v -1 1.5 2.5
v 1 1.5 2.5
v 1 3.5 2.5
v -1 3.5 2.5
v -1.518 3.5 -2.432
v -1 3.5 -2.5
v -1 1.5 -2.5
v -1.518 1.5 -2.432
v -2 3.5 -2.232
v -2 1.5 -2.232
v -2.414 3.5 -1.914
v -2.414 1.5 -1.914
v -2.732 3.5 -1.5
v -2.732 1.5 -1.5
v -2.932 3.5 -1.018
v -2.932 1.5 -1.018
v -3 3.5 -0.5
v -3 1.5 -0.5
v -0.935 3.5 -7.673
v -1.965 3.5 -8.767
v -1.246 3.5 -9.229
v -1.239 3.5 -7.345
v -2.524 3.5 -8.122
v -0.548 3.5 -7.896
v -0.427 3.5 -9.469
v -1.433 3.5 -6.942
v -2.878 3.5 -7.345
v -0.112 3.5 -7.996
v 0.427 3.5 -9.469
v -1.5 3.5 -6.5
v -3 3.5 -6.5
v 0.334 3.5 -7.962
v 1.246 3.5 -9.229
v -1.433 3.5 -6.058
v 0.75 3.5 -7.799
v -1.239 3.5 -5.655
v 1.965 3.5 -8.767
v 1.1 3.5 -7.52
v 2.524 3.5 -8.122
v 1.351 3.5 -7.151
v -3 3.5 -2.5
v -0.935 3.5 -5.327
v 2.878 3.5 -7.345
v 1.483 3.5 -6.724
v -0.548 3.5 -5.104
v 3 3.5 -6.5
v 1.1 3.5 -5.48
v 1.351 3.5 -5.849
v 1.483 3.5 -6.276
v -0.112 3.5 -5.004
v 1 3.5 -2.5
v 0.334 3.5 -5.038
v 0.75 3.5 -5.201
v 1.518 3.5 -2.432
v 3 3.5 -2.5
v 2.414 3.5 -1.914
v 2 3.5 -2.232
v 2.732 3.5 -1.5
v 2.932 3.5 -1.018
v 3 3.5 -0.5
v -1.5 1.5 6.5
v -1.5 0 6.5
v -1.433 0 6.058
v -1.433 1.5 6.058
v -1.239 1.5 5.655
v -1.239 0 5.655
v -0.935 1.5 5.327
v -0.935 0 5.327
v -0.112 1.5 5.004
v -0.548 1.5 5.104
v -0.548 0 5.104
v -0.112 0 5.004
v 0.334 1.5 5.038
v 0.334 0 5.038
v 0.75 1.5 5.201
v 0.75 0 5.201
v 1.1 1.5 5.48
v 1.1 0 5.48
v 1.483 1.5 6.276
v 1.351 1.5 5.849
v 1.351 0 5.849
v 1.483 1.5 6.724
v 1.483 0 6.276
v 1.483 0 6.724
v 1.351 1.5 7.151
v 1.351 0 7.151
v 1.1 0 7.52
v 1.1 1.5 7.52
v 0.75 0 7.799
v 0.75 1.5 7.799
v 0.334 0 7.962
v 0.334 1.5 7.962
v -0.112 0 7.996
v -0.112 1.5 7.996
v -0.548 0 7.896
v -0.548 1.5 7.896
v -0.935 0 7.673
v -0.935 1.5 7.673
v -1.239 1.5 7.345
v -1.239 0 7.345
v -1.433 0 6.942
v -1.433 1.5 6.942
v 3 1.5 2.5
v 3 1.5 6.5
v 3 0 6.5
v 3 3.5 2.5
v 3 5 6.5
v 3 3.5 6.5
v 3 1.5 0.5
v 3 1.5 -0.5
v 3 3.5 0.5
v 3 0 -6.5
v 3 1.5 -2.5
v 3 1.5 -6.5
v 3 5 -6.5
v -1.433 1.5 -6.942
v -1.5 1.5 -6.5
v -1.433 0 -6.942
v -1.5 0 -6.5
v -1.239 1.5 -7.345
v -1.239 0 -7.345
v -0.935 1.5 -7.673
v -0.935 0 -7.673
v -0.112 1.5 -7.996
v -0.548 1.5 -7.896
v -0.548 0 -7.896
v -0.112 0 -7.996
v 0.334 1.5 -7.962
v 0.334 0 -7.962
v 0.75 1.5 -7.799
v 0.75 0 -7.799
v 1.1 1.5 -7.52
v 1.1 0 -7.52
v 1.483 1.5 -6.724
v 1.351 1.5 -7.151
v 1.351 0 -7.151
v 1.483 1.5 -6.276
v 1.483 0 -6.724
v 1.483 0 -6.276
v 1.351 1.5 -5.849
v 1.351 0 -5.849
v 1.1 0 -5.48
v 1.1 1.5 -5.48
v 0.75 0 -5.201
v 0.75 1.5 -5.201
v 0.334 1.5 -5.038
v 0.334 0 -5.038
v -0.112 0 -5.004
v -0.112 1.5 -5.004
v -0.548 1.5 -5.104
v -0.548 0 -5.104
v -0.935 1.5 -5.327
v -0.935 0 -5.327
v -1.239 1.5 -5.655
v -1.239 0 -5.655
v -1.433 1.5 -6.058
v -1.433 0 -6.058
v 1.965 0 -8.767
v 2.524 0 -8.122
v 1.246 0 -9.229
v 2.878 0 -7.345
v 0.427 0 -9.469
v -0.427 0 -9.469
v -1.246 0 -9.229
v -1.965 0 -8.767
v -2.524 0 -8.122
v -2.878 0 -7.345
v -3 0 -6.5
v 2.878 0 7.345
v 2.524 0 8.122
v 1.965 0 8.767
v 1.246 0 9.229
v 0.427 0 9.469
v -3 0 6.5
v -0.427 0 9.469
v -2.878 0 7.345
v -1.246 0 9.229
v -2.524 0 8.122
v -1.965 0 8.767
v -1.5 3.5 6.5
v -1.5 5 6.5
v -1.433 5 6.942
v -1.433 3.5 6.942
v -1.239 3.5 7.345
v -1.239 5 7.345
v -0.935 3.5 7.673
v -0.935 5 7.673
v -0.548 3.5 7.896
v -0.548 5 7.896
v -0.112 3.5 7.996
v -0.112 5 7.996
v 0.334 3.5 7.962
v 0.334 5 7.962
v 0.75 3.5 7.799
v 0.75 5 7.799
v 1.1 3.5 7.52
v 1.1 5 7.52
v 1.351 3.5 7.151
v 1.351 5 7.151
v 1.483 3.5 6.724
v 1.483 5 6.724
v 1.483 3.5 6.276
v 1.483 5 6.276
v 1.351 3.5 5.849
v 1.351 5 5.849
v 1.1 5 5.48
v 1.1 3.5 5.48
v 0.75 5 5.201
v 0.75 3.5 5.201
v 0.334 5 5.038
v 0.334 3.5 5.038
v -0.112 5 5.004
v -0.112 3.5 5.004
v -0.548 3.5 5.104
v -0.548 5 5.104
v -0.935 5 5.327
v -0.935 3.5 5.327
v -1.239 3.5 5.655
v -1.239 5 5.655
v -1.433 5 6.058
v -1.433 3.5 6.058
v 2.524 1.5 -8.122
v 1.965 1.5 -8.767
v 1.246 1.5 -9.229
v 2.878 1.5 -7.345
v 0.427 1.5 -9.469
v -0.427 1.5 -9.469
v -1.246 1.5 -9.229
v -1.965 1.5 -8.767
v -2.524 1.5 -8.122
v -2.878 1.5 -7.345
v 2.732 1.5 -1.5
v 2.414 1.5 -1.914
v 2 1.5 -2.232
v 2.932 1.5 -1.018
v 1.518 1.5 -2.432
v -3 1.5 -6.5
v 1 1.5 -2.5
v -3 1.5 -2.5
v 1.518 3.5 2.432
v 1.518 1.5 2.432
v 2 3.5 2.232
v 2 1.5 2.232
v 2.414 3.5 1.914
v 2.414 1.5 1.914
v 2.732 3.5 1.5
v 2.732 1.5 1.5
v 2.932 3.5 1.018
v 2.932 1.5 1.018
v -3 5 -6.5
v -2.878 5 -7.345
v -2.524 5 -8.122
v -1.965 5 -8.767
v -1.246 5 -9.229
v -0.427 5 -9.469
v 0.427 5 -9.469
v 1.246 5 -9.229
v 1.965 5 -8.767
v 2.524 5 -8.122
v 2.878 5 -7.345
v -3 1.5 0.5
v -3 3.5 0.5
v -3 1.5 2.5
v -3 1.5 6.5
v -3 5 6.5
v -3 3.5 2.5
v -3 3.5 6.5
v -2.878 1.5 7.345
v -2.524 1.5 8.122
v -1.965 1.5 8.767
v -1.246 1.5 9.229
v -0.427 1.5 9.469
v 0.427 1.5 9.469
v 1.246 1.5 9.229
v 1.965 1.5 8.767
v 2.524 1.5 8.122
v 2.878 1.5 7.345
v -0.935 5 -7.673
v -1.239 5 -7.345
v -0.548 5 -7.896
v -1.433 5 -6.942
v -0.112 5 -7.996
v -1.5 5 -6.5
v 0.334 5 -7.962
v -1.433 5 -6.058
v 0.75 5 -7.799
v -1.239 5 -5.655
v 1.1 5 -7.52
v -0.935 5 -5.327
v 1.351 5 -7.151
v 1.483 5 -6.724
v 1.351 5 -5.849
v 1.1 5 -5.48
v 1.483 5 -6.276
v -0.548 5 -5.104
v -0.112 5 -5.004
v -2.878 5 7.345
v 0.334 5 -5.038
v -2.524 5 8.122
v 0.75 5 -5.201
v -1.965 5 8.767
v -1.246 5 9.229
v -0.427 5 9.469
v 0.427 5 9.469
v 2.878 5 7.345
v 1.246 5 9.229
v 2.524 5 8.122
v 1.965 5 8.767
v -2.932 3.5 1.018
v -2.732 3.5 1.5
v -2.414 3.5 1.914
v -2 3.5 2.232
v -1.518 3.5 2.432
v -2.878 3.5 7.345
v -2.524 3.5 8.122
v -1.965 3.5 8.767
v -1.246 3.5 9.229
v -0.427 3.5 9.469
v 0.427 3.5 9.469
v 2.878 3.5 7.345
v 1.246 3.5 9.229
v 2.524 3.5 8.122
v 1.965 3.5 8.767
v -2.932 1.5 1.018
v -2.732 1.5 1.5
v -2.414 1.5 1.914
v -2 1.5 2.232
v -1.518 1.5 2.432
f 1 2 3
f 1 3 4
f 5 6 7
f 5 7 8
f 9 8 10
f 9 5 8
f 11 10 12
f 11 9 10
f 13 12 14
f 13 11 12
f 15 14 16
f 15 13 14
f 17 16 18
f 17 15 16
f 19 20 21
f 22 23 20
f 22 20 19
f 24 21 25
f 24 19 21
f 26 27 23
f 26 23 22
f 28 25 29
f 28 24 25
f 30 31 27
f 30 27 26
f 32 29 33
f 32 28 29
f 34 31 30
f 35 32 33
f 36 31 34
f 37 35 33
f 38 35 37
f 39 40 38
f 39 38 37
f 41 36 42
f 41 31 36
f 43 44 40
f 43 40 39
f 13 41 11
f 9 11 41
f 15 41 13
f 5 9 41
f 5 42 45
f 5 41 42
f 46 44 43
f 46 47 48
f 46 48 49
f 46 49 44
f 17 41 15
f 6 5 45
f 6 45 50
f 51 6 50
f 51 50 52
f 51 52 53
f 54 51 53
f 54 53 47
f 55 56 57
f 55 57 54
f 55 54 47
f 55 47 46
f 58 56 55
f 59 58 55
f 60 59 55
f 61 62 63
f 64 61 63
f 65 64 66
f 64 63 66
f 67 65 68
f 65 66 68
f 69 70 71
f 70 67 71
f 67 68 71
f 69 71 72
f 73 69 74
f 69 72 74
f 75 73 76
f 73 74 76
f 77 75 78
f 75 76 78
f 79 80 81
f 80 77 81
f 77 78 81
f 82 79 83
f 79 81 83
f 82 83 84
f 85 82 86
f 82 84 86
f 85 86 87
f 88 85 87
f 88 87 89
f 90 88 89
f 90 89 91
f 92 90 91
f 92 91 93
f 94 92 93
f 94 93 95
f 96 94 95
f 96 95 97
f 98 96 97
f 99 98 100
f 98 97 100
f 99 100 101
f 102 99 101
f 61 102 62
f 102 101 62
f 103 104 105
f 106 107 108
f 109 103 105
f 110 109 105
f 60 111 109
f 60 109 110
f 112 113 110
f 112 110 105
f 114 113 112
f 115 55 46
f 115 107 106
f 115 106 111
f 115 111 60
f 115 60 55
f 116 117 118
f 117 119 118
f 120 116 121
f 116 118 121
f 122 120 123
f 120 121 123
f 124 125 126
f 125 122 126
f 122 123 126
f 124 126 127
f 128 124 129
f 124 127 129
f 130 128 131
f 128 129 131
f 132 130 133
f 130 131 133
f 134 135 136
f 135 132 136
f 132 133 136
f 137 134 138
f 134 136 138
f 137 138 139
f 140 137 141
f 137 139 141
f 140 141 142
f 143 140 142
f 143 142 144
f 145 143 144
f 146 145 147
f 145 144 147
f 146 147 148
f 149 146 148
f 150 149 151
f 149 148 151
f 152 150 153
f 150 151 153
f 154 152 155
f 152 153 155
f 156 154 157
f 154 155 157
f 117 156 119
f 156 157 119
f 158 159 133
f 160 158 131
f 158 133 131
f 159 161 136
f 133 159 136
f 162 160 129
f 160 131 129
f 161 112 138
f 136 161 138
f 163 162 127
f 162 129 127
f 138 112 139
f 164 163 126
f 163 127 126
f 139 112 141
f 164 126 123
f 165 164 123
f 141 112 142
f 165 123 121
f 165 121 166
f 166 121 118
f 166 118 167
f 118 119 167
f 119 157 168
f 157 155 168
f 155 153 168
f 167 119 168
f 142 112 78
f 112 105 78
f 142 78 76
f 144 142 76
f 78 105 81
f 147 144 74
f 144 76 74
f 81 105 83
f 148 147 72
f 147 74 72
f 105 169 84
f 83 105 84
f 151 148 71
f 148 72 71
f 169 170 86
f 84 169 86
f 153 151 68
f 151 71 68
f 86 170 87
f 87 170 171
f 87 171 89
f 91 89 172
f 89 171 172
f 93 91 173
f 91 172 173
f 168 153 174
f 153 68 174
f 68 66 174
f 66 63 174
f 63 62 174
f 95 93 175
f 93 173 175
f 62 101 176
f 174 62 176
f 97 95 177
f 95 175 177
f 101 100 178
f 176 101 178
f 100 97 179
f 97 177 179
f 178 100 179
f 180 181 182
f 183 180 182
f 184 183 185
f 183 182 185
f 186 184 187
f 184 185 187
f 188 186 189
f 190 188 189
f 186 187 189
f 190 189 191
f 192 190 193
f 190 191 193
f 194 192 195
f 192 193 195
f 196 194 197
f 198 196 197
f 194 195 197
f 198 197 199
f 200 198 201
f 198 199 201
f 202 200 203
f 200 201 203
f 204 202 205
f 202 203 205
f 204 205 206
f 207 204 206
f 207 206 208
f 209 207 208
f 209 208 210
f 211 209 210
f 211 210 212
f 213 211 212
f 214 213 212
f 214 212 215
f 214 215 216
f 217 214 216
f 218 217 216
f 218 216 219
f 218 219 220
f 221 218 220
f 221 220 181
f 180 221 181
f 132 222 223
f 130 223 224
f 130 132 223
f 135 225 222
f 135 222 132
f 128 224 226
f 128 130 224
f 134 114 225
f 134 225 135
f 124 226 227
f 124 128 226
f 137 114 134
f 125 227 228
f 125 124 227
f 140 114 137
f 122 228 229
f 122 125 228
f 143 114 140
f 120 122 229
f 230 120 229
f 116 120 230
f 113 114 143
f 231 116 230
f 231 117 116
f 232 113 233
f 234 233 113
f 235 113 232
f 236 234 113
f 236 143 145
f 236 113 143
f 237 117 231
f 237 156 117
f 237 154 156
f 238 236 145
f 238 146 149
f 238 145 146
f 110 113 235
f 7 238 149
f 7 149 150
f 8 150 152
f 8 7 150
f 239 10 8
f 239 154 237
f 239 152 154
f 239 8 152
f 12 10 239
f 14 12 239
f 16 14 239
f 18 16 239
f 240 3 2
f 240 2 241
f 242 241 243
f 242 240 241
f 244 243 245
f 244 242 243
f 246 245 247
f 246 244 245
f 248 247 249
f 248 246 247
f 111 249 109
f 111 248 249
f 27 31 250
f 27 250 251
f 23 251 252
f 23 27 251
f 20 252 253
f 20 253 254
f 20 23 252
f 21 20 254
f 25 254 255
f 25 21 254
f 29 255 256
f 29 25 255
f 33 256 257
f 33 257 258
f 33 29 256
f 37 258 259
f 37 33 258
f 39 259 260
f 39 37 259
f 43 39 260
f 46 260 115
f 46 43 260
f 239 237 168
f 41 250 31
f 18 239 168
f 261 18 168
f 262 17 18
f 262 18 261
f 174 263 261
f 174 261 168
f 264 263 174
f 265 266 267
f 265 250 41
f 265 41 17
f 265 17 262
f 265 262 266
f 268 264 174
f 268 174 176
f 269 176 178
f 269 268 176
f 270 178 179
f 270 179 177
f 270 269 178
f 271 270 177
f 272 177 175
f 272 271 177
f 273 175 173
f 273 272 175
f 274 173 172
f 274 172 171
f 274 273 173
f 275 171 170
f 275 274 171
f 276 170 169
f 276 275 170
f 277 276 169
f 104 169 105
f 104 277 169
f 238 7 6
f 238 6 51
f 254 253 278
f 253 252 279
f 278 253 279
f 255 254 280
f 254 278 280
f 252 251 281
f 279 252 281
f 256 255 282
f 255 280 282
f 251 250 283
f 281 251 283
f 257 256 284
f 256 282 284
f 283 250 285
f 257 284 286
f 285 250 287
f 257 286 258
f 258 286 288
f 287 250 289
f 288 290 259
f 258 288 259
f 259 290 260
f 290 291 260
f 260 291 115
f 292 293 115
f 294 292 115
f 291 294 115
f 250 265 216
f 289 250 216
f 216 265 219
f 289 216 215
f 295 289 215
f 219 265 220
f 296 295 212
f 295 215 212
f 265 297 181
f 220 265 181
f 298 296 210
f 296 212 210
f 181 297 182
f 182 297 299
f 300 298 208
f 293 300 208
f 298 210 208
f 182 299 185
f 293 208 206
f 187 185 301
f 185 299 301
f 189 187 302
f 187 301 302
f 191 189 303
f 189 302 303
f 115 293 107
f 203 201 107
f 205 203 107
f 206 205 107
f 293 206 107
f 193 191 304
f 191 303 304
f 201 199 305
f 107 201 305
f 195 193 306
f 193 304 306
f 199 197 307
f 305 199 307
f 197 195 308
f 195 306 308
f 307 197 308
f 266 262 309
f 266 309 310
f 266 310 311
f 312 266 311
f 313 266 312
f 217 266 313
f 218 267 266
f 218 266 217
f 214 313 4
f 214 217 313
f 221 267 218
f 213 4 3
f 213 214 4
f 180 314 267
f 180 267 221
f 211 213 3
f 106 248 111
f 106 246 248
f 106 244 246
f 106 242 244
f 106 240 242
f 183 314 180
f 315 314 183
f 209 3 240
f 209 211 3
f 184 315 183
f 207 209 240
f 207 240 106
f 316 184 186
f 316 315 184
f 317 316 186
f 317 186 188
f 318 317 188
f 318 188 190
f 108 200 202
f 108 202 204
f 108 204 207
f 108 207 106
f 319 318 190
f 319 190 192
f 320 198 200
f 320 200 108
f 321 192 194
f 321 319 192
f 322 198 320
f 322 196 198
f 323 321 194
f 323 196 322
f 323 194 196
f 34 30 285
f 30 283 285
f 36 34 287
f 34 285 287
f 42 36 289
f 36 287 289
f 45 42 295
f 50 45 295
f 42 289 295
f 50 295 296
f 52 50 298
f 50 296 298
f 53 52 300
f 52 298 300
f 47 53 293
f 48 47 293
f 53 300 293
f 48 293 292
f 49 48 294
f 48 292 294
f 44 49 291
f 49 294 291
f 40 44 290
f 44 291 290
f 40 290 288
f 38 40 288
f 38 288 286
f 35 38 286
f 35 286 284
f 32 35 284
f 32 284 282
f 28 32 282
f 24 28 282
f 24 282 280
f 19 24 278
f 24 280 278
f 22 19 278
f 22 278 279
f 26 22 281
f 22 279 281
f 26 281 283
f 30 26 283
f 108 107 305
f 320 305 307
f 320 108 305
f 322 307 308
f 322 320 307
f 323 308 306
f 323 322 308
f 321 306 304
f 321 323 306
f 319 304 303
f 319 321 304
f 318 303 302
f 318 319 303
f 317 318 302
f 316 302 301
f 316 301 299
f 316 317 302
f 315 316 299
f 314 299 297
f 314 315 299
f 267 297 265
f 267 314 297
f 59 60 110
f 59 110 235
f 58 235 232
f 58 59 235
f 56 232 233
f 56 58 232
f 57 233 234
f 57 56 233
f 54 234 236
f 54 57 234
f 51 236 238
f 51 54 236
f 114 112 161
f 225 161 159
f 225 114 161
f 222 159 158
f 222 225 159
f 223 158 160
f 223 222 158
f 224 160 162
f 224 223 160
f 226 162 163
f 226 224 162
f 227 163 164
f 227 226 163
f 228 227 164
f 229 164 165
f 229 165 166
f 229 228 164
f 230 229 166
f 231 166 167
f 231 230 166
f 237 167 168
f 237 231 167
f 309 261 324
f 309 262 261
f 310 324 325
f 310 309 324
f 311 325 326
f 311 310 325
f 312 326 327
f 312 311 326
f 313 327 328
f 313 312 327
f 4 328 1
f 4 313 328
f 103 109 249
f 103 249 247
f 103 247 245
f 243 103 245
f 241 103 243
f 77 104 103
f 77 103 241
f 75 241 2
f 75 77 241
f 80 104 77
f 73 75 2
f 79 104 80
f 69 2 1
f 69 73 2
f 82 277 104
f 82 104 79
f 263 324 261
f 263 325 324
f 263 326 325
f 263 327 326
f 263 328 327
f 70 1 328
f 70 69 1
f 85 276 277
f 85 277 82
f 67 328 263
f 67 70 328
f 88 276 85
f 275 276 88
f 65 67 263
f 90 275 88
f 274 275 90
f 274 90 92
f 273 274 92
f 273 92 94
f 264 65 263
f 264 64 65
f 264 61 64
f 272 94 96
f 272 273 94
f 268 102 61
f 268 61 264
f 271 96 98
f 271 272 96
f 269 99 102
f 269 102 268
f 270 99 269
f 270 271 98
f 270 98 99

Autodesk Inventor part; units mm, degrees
ref_plane "YZ Plane" through (0, 0, 0) normal (1, 0, 0) x (0, 1, 0)
ref_plane "XZ Plane" through (0, 0, 0) normal (0, 1, 0) x (-1, 0, 0)
ref_plane "XY Plane" through (0, 0, 0) normal (0, 0, 1) x (1, 0, 0)
sketch "Sketch1" plane through (0, 0, 0) normal (0, 1, 0) x (-1, 0, 0)
  line L0 (-3, 10) -> (3, 10)
  line L1 (3, 10) -> (3, -10)
  line L2 (3, -10) -> (-3, -10)
  line L3 (-3, -10) -> (-3, 10)
  line L4 (-3, 10) -> (3, -10) construction
  line L5 (3, 10) -> (-3, -10) construction
  line L6 (0, -10) -> (0, -6.5) construction
  line L7 (0, 10) -> (0, 6.5) construction
  circle A0 centre (0, 6.5) radius 1.5
  circle A1 centre (0, -6.5) radius 1.5
  point P0 (0, 0)
  dimension "d0" = 6
  dimension "d1" = 20
  dimension "d2" = 3.5
  dimension "d3" = 3.5
  dimension "d4" = 3
  dimension "d5" = 3
extrude "Extrusion1" add sketch "Sketch1" along normal blind 1.5
fillet "Fillet1" radius 2 4 edges at (3, 0.75, 10) (-3, 0.75, 10) (3, 0.75, -10) (-3, 0.75, -10)
sketch "Sketch2" plane through (0, 1.5, 0) normal (0, 1, 0) x (1, 0, 0)
  circle A0 centre (0, -6.5) radius 1.5 projected
  circle A1 centre (0, -6.5) radius 1.5
  circle A2 centre (0, -6.5) radius 3
  line L0 (-3, -6.5) -> (3, -6.5)
  line L1 (3, -6.5) -> (3, -10)
  line L2 (3, -10) -> (-3, -10)
  line L3 (-3, -10) -> (-3, -6.5)
  point P0 (0, 0)
  point P1 (3, -6.5)
  dimension "d9" = 6
  dimension "d10" = 3
  dimension "d11" = 3.5
extrude "Extrusion2" cut sketch "Sketch2" against normal through all contours L1 L2 L3 A2
mirror "Mirror1" about plane through (0, 0, 0) normal (0, 0, 1) of "Extrusion2"
sketch "Sketch3" plane through (0, 1.5, 0) normal (0, 1, 0) x (1, 0, 0)
  line L0 (-3, 6.5) -> (-3, -6.5) projected
  line L1 (3, -2.5) -> (-3, -2.5)
  line L2 (-3, -2.5) -> (-3, 2.5)
  line L3 (-3, 2.5) -> (3, 2.5)
  line L4 (3, 2.5) -> (3, -2.5)
  line L5 (3, -2.5) -> (-3, 2.5) construction
  line L6 (-3, -2.5) -> (3, 2.5) construction
  point P0 (0, 0)
  dimension "d14" = 5
extrude "Extrusion3" add sketch "Sketch3" along normal blind 2
ref_plane "Work Plane1" through (0, 2.5, 0) normal (0, -1, 0) x (1, 0, 0)
mirror "Mirror2" about plane through (0, 2.5, 0) normal (0, -1, 0) of "Extrusion1", "Fillet1", "Extrusion2", "Mirror1"
fillet "Fillet2" radius 2 4 edges at (3, 2.5, 2.5) (3, 2.5, -2.5) (-3, 2.5, 2.5) (-3, 2.5, -2.5)
properties part number "DAWN_chain_round"
